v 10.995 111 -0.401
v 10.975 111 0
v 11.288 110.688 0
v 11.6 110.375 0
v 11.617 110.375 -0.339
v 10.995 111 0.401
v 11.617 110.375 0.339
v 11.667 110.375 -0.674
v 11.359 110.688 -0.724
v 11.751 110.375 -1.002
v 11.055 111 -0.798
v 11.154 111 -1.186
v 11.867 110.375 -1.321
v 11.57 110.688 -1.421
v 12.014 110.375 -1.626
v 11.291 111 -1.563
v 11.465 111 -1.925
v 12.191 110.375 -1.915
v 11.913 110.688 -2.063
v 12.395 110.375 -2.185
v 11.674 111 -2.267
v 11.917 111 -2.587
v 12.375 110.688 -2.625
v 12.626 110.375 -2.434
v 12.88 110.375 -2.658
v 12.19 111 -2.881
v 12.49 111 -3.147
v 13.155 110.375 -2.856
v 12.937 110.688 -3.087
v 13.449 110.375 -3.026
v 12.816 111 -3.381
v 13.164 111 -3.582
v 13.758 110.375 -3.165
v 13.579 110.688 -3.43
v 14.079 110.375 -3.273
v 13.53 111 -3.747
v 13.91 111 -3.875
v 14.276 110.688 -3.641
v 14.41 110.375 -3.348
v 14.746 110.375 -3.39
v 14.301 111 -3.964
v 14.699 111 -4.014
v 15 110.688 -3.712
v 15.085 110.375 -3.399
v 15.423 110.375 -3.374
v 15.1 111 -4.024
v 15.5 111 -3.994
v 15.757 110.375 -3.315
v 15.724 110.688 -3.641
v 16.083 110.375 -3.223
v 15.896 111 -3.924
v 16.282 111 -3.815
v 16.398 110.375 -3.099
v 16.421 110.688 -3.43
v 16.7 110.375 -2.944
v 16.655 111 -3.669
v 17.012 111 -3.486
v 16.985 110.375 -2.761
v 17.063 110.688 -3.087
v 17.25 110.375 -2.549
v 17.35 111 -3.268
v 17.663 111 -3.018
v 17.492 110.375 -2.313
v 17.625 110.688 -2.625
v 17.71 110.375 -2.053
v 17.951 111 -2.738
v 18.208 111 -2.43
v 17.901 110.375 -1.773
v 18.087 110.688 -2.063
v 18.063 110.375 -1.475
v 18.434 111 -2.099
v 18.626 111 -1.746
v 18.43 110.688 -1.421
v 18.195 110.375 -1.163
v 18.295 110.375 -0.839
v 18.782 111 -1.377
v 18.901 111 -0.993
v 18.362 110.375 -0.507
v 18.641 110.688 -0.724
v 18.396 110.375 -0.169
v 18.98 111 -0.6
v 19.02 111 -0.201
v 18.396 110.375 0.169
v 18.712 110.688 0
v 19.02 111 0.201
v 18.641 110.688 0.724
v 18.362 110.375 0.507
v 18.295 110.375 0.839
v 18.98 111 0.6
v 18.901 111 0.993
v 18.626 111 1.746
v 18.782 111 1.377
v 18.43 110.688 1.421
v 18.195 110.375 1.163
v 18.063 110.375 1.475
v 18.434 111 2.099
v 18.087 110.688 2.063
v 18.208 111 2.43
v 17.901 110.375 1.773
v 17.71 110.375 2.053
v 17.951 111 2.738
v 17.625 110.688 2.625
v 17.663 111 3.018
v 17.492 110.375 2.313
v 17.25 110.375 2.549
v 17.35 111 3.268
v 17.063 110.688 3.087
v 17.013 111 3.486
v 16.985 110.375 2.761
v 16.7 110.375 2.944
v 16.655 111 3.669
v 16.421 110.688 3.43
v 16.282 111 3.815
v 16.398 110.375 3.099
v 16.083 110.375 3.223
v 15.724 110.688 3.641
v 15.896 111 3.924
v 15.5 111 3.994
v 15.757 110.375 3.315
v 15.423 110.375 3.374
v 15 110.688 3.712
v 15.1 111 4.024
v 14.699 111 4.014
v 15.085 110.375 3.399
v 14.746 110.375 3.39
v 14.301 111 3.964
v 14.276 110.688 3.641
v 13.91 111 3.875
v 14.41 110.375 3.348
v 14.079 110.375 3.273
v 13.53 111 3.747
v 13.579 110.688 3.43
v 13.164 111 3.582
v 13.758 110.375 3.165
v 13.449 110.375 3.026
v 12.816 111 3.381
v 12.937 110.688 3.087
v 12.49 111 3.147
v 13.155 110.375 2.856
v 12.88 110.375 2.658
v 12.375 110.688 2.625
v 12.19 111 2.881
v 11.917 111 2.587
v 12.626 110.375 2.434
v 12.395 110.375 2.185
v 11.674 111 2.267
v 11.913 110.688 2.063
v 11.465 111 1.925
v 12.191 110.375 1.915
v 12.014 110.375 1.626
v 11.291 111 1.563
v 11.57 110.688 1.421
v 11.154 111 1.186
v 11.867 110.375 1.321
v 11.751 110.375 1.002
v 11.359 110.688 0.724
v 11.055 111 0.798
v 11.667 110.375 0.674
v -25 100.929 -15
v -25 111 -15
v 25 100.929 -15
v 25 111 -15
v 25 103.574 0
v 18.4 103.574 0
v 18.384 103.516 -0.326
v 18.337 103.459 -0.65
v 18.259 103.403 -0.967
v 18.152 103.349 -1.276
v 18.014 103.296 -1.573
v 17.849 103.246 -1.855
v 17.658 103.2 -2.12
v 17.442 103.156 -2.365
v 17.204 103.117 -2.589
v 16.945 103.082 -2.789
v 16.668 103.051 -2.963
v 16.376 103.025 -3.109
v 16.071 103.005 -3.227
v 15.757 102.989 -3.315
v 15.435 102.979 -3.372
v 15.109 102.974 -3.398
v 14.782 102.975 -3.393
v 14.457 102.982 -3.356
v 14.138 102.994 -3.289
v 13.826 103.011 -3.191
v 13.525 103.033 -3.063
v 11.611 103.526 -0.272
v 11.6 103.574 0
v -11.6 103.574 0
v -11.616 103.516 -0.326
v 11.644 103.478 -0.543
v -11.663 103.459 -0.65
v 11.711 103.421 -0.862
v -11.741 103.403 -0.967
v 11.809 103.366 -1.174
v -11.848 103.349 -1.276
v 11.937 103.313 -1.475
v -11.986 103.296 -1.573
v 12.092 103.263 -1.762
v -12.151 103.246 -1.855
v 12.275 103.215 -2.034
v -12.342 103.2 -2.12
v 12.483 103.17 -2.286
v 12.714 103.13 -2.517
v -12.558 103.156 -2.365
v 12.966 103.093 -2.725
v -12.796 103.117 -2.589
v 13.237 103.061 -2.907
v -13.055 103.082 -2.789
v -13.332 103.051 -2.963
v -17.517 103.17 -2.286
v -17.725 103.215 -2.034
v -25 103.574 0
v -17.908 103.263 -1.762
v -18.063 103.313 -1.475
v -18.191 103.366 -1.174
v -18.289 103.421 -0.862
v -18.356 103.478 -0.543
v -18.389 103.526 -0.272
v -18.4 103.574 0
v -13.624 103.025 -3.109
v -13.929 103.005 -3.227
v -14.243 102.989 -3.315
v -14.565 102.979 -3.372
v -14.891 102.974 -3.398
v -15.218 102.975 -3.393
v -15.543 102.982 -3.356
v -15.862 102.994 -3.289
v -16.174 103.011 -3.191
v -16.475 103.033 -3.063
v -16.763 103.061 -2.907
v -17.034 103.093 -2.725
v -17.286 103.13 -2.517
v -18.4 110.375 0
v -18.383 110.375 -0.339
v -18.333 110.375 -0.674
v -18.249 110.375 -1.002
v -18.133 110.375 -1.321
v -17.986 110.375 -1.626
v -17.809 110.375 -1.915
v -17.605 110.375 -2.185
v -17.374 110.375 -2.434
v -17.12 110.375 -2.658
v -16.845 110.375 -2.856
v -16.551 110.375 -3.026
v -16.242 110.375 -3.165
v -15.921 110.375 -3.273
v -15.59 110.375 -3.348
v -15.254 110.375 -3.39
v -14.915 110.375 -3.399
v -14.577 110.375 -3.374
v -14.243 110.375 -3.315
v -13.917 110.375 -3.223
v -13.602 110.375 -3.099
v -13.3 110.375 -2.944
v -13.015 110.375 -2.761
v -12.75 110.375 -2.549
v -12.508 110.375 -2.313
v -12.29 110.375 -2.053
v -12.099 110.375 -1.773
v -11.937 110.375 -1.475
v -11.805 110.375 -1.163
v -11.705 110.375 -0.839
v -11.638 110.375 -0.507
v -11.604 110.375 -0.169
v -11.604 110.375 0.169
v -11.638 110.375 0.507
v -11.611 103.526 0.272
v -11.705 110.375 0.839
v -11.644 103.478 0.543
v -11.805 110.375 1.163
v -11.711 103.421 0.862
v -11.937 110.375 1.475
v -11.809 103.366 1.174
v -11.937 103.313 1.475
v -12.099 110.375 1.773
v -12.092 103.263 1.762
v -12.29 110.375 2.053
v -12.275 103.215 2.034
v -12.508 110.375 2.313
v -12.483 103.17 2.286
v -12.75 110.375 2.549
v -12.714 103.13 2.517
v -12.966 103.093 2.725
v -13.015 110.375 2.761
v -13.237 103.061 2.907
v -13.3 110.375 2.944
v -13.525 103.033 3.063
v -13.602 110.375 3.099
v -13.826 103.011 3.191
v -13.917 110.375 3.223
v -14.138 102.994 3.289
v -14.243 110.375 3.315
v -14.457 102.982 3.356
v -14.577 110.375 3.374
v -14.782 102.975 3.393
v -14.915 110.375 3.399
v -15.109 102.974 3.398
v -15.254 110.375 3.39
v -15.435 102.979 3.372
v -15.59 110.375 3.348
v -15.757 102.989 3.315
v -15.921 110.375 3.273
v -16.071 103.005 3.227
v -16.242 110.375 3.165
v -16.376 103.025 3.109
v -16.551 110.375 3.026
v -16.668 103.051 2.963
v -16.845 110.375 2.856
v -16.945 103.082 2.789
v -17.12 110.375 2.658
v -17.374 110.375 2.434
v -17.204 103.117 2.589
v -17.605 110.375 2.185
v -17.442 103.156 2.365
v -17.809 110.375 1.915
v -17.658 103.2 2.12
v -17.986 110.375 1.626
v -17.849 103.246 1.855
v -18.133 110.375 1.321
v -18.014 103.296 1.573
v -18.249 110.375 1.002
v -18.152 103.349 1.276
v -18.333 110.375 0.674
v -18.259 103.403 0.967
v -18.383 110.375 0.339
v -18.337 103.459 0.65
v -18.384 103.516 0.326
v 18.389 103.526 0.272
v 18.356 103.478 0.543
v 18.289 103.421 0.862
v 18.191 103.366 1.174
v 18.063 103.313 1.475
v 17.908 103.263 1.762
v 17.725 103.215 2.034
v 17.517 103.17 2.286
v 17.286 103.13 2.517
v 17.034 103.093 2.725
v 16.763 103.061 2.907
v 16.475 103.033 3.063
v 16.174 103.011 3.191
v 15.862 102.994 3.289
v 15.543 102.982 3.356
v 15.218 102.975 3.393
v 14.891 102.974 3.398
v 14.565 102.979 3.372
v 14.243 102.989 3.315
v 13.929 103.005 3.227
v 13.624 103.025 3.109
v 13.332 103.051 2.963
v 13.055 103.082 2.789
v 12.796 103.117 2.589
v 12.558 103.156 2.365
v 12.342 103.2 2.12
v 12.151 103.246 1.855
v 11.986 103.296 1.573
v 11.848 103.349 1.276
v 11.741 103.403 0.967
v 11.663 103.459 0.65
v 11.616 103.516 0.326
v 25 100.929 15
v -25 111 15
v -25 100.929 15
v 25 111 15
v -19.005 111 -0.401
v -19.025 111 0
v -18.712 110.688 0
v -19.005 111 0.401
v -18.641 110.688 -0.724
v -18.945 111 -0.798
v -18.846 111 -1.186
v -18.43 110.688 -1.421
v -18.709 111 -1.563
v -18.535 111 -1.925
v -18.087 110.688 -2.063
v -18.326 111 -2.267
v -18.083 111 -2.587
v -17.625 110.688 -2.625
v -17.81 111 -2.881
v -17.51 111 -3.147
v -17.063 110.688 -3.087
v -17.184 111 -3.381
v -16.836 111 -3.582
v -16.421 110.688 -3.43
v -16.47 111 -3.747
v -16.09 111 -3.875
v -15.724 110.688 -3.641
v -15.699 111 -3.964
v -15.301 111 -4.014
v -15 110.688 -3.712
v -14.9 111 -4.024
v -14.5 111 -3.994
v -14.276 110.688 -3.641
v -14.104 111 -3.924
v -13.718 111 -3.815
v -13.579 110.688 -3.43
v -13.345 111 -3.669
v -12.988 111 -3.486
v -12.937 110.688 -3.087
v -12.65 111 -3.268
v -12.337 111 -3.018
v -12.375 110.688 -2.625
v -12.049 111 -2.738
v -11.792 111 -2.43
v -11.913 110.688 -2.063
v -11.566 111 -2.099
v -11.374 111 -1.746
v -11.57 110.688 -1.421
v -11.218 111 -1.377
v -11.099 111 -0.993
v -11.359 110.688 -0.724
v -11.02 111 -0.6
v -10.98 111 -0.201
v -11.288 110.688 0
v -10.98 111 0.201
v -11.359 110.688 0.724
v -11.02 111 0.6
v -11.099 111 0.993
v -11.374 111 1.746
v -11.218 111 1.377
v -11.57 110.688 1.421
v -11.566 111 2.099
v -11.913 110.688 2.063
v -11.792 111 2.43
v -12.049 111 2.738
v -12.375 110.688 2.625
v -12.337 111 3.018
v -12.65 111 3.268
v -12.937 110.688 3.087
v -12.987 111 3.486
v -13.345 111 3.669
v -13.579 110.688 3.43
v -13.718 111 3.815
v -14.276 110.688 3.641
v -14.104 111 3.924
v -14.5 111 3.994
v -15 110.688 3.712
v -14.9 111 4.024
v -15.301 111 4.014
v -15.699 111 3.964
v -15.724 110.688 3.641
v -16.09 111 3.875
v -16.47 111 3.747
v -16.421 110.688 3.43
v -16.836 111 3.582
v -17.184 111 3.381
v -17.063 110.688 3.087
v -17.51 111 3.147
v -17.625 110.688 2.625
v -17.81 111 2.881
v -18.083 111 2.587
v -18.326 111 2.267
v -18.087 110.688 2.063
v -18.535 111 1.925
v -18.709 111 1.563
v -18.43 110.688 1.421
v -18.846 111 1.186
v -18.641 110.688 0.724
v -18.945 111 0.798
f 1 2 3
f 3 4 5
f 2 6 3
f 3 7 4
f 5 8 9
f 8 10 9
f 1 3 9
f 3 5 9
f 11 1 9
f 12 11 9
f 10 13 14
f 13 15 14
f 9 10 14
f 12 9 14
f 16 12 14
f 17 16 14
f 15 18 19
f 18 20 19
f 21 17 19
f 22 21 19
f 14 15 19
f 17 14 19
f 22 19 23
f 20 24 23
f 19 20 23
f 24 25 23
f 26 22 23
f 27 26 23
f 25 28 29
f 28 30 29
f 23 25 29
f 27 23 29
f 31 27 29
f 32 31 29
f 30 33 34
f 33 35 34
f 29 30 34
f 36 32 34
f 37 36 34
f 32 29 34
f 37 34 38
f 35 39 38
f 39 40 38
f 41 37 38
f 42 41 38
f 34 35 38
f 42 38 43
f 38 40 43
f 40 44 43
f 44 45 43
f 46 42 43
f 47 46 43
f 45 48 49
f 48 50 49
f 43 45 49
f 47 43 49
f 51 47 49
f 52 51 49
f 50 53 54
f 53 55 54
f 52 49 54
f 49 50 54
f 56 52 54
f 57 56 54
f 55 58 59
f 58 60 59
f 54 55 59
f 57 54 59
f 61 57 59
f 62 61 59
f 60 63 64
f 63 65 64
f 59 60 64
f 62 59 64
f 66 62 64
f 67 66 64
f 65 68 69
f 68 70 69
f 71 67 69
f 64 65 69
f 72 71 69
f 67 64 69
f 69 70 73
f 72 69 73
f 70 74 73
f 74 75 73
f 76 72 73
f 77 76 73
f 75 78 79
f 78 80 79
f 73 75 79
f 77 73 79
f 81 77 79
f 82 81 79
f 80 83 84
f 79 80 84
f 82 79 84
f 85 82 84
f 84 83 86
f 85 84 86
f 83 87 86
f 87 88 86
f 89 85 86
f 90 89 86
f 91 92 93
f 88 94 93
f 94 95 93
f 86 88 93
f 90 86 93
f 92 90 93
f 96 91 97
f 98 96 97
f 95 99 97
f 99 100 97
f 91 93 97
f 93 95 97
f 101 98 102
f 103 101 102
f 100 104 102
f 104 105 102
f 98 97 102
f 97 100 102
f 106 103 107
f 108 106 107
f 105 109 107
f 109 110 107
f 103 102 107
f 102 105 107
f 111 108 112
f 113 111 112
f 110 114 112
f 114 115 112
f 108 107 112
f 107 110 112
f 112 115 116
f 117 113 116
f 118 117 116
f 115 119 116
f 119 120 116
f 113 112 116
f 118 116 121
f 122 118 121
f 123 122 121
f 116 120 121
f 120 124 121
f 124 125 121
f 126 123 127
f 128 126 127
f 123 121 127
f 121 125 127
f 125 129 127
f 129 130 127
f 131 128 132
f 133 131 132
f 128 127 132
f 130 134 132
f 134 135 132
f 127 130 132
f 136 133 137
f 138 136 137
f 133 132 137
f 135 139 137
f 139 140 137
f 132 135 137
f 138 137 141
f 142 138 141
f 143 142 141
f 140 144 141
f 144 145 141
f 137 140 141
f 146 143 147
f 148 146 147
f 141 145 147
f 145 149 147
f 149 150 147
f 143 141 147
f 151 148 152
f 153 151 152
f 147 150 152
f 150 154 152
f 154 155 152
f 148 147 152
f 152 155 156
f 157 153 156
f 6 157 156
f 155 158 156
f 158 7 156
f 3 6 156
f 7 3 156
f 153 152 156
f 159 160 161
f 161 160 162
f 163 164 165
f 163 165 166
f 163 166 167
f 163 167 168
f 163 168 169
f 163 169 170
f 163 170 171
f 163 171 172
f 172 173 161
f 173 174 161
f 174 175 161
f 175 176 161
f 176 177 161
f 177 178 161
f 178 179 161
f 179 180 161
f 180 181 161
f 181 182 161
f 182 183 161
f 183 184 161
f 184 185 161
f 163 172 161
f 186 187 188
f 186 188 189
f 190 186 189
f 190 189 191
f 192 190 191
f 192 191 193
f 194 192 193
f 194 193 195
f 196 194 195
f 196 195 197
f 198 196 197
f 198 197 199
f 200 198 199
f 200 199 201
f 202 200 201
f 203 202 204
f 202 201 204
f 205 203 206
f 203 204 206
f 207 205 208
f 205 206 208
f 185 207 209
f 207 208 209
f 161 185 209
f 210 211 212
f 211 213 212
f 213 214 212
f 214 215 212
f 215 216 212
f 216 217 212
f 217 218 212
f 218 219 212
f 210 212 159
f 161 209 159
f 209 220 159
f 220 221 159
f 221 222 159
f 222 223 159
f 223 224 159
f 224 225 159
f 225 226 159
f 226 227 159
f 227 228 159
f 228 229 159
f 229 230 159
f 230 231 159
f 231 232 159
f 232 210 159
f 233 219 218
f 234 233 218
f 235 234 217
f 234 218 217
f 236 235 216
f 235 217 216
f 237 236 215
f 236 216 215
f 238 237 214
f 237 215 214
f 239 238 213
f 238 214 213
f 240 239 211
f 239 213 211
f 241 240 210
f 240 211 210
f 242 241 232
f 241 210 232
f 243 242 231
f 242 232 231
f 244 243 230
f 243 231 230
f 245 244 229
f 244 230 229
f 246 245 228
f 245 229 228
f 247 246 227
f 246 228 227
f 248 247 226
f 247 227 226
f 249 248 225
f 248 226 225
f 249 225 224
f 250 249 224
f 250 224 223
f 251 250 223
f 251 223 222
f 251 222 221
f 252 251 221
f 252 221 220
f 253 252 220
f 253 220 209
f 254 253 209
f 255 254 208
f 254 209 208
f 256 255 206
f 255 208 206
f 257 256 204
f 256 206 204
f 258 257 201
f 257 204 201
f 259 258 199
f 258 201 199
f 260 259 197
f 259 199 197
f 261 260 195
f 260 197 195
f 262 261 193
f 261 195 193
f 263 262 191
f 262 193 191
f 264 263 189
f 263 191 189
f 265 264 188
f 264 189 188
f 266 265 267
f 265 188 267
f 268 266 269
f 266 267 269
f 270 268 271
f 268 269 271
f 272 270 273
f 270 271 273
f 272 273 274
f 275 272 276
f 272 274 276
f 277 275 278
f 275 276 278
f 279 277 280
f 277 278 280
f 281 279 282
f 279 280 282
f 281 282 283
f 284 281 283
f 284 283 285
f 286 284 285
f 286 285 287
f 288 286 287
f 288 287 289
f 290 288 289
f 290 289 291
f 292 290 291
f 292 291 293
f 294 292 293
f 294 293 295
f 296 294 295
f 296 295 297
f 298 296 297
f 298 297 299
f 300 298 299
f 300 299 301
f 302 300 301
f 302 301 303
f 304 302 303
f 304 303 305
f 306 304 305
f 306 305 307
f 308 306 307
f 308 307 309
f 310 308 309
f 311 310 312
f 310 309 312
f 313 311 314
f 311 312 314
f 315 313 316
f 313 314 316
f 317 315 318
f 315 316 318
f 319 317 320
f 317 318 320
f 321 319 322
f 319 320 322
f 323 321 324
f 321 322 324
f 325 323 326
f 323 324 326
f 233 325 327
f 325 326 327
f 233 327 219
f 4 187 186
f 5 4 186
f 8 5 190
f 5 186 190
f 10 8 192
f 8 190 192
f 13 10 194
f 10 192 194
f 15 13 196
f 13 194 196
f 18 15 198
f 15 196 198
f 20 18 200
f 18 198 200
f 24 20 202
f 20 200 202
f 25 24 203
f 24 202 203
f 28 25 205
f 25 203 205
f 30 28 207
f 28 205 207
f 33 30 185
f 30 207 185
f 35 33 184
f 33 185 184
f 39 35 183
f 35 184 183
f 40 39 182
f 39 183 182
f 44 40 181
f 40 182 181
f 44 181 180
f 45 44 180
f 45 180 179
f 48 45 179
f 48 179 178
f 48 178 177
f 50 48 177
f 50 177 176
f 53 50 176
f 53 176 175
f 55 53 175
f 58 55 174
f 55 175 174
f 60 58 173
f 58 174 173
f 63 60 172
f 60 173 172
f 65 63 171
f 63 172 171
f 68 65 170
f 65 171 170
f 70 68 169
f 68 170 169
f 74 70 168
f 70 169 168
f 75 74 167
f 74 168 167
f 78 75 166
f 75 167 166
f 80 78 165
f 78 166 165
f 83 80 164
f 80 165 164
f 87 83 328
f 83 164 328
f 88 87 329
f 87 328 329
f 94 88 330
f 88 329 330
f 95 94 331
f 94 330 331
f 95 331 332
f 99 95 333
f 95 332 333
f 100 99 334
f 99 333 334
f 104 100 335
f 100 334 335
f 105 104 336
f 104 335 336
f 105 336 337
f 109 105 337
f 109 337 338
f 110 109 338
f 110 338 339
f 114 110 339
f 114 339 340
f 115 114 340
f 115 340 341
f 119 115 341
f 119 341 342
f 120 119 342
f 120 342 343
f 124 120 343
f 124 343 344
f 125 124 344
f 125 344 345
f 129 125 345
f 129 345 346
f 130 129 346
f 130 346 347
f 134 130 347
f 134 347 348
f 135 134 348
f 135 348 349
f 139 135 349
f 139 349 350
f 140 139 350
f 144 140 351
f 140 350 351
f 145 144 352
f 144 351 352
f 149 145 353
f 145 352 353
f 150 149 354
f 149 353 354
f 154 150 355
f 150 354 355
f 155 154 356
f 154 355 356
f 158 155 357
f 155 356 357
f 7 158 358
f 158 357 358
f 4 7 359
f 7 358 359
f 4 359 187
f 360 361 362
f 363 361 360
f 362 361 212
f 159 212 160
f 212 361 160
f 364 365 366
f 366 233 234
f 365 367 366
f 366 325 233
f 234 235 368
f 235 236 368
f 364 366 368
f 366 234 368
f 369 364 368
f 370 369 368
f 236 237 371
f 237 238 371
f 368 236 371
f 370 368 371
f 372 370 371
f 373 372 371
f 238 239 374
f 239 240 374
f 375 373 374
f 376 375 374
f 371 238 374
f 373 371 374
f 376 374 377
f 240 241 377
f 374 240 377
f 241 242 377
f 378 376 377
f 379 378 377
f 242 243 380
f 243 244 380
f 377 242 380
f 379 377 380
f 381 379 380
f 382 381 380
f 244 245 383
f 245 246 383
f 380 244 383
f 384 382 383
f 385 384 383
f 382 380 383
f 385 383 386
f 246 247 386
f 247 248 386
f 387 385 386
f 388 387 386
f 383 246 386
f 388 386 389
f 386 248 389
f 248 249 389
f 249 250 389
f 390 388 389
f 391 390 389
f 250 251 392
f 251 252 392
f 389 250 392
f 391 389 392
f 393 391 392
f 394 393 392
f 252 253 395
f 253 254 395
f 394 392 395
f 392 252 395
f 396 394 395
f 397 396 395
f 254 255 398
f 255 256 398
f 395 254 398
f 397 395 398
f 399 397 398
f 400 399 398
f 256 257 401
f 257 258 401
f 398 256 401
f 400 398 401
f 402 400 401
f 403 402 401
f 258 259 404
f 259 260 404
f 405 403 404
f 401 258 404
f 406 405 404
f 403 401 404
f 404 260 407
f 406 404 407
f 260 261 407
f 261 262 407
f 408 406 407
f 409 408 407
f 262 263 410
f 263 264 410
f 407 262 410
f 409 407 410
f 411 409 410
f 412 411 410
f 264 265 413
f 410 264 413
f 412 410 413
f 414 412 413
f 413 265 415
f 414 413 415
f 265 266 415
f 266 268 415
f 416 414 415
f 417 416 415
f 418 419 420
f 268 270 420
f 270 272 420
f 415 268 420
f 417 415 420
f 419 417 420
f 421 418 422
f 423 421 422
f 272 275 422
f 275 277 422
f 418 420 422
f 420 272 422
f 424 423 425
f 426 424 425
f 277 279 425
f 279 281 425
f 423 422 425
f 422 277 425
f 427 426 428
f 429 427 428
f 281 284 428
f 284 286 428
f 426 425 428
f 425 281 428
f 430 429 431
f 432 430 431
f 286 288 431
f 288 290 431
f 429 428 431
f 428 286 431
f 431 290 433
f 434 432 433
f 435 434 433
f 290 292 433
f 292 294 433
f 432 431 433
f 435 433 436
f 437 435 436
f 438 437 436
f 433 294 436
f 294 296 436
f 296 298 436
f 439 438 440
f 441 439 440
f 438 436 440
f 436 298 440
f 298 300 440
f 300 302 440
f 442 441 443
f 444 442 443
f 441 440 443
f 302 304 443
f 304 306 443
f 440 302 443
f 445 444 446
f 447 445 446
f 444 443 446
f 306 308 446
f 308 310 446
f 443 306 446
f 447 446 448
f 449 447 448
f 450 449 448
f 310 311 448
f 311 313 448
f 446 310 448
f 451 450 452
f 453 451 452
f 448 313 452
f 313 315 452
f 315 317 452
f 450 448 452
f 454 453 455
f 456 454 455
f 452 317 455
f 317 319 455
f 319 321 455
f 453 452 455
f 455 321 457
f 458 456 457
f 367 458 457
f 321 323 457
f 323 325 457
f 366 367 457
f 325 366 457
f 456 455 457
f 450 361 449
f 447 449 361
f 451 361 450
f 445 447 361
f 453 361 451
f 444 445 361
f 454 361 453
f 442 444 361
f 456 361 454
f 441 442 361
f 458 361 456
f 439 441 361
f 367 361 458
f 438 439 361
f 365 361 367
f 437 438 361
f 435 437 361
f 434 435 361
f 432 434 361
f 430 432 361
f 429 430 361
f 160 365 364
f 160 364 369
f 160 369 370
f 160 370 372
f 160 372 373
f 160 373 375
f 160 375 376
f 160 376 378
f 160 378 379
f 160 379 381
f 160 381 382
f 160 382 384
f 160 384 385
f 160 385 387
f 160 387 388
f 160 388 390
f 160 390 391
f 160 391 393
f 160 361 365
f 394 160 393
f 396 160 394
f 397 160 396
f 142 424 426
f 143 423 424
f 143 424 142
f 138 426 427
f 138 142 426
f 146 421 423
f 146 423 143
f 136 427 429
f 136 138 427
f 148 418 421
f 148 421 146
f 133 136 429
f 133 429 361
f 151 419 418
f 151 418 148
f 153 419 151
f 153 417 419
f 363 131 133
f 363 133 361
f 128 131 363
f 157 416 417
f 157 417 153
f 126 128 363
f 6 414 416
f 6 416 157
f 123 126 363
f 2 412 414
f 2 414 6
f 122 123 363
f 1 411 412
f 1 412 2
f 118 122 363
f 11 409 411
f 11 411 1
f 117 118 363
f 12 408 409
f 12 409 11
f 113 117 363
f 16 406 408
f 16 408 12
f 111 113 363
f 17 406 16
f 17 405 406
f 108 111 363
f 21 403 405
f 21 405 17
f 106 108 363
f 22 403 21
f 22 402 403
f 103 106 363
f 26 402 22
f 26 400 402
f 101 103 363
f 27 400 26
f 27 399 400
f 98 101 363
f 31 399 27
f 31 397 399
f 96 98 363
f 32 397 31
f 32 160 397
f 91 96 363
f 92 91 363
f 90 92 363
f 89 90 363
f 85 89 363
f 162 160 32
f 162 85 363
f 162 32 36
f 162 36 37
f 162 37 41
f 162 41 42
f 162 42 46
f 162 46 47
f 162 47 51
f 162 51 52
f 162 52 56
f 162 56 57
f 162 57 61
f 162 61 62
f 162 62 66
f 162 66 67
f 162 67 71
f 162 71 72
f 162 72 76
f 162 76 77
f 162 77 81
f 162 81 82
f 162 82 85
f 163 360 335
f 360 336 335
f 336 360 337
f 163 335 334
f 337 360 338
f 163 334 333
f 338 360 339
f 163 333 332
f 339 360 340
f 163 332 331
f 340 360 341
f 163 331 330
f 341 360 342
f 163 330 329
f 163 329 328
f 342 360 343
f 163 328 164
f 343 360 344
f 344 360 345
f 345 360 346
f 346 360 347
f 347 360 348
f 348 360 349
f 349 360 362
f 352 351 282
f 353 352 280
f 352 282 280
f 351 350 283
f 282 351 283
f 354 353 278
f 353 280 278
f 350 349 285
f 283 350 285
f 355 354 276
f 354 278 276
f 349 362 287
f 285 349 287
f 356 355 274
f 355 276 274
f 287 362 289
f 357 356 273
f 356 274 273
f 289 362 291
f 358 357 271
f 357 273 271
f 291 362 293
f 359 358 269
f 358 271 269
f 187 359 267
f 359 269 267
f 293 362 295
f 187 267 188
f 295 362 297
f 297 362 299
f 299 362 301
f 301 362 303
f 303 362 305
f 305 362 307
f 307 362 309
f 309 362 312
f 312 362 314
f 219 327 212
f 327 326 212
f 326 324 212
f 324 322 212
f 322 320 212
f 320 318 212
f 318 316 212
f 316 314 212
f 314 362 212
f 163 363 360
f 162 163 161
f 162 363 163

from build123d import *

# Parameters (mm, degrees)
SKETCH_2_W                  = 50
SKETCH_2_H                  = 30
EXTRUDE_1_DEPTH             = 6
HOLE_WIZARD_M81_D           = 6.8
HOLE_WIZARD_M81_CSINK_D     = 8.05
HOLE_WIZARD_M81_CSINK_ANGLE = 90
CUT_EXTRUDE_1_DEPTH         = 115.764977236
CUT_EXTRUDE_1_DEPTH_BACK    = 115.764977236


with BuildPart() as part:
    # Эскиз2 → Бобышка-Вытянуть1 (new, symmetric)
    with BuildSketch(Plane(origin=(0, 105, 0), x_dir=(1, 0, 0), z_dir=(0, 1, 0))):
        Rectangle(SKETCH_2_W, SKETCH_2_H)
    extrude(amount=EXTRUDE_1_DEPTH, both=True)

    # Отверстие обработанное метчиком M81 (through all)
    with Locations(Plane(origin=(0, 111, 0), x_dir=(1, 0, 0), z_dir=(0, 1, 0))):
        with Locations((15, 0), (-15, 0)):
            CounterSinkHole(HOLE_WIZARD_M81_D / 2, HOLE_WIZARD_M81_CSINK_D / 2, counter_sink_angle=HOLE_WIZARD_M81_CSINK_ANGLE)

    # Эскиз5 → Вырез-Вытянуть1 (cut, two sides: drawn at the far end of the back side and taken through both)
    with BuildSketch(Plane(origin=(0, 0, 0), x_dir=(0, 0, -1), z_dir=(1, 0, 0)).offset(-CUT_EXTRUDE_1_DEPTH_BACK)):
        Polygon((-34.027690918, 97.573514412), (0, 103.573514412), (34.027690918, 97.573514412), align=None)
    extrude(amount=CUT_EXTRUDE_1_DEPTH + CUT_EXTRUDE_1_DEPTH_BACK, mode=Mode.SUBTRACT)


solid = part.part
